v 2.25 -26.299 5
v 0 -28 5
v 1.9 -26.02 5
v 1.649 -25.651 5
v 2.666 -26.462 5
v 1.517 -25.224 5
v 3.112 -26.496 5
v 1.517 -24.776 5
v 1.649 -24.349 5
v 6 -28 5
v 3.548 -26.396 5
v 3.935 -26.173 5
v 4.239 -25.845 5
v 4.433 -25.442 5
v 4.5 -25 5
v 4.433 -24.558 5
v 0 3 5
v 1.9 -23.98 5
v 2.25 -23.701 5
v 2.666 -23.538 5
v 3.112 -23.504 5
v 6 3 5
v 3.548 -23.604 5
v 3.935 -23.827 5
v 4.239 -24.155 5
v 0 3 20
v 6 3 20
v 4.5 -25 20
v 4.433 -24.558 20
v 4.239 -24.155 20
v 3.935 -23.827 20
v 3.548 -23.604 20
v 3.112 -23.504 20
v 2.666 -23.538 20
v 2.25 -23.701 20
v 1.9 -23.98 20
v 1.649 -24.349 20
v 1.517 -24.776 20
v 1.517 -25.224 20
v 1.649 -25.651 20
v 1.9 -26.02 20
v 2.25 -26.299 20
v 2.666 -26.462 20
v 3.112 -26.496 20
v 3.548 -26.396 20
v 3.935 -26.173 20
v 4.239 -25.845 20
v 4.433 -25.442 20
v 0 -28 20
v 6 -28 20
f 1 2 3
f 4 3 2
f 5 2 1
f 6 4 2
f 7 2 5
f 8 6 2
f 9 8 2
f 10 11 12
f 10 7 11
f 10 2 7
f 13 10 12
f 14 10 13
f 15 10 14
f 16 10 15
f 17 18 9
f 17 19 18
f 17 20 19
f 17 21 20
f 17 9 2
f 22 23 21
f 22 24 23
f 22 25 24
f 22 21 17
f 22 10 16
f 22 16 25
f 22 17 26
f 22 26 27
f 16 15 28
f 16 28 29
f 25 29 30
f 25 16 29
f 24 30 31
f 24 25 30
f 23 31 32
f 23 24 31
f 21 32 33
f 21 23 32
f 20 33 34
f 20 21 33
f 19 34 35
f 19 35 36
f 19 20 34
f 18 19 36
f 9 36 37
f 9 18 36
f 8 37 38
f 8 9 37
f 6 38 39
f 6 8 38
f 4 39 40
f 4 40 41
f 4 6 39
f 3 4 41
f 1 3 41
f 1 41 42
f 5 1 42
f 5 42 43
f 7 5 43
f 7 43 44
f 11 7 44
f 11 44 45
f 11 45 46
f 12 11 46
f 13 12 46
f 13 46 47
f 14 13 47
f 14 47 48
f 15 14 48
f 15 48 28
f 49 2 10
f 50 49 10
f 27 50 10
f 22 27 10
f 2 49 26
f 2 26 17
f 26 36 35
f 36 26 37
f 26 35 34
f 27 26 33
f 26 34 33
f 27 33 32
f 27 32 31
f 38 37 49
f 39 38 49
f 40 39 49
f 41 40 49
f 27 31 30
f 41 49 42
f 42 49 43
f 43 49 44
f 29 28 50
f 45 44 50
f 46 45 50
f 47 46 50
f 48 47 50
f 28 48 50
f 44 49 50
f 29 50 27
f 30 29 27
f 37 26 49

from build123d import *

# Parameters (mm, degrees)
SKETCH_1_W          = 6
SKETCH_1_H          = 28
SKETCH_1_R          = 1.5
EXTRUDE_1_DEPTH     = 20
SKETCH_2_W          = 6
SKETCH_2_H          = 20
EXTRUDE_2_DEPTH     = 3
SKETCH_3_W          = 5
SKETCH_3_H          = 31
CUT_EXTRUDE_1_DEPTH = 8


with BuildPart() as part:
    # 草图1 → 凸台-拉伸1 (new body)
    with BuildSketch(Plane.XY):
        with Locations((3, -14)):
            Rectangle(SKETCH_1_W, SKETCH_1_H)
        with Locations((3, -25)):
            Circle(SKETCH_1_R, mode=Mode.SUBTRACT)
    extrude(amount=EXTRUDE_1_DEPTH)

    # 草图2 → 凸台-拉伸2 (add)
    with BuildSketch(Plane(origin=(0, 0, 0), x_dir=(1, 0, 0), z_dir=(0, 1, 0))):
        with Locations((3, -10)):
            Rectangle(SKETCH_2_W, SKETCH_2_H)
    extrude(amount=EXTRUDE_2_DEPTH)

    # 草图3 → 切除-拉伸1 (cut)
    with BuildSketch(Plane(origin=(6, 0, 0), x_dir=(0, 0, -1), z_dir=(1, 0, 0))):
        with Locations((-2.5, -12.5)):
            Rectangle(SKETCH_3_W, SKETCH_3_H)
    extrude(amount=-CUT_EXTRUDE_1_DEPTH, mode=Mode.SUBTRACT)


solid = part.part
